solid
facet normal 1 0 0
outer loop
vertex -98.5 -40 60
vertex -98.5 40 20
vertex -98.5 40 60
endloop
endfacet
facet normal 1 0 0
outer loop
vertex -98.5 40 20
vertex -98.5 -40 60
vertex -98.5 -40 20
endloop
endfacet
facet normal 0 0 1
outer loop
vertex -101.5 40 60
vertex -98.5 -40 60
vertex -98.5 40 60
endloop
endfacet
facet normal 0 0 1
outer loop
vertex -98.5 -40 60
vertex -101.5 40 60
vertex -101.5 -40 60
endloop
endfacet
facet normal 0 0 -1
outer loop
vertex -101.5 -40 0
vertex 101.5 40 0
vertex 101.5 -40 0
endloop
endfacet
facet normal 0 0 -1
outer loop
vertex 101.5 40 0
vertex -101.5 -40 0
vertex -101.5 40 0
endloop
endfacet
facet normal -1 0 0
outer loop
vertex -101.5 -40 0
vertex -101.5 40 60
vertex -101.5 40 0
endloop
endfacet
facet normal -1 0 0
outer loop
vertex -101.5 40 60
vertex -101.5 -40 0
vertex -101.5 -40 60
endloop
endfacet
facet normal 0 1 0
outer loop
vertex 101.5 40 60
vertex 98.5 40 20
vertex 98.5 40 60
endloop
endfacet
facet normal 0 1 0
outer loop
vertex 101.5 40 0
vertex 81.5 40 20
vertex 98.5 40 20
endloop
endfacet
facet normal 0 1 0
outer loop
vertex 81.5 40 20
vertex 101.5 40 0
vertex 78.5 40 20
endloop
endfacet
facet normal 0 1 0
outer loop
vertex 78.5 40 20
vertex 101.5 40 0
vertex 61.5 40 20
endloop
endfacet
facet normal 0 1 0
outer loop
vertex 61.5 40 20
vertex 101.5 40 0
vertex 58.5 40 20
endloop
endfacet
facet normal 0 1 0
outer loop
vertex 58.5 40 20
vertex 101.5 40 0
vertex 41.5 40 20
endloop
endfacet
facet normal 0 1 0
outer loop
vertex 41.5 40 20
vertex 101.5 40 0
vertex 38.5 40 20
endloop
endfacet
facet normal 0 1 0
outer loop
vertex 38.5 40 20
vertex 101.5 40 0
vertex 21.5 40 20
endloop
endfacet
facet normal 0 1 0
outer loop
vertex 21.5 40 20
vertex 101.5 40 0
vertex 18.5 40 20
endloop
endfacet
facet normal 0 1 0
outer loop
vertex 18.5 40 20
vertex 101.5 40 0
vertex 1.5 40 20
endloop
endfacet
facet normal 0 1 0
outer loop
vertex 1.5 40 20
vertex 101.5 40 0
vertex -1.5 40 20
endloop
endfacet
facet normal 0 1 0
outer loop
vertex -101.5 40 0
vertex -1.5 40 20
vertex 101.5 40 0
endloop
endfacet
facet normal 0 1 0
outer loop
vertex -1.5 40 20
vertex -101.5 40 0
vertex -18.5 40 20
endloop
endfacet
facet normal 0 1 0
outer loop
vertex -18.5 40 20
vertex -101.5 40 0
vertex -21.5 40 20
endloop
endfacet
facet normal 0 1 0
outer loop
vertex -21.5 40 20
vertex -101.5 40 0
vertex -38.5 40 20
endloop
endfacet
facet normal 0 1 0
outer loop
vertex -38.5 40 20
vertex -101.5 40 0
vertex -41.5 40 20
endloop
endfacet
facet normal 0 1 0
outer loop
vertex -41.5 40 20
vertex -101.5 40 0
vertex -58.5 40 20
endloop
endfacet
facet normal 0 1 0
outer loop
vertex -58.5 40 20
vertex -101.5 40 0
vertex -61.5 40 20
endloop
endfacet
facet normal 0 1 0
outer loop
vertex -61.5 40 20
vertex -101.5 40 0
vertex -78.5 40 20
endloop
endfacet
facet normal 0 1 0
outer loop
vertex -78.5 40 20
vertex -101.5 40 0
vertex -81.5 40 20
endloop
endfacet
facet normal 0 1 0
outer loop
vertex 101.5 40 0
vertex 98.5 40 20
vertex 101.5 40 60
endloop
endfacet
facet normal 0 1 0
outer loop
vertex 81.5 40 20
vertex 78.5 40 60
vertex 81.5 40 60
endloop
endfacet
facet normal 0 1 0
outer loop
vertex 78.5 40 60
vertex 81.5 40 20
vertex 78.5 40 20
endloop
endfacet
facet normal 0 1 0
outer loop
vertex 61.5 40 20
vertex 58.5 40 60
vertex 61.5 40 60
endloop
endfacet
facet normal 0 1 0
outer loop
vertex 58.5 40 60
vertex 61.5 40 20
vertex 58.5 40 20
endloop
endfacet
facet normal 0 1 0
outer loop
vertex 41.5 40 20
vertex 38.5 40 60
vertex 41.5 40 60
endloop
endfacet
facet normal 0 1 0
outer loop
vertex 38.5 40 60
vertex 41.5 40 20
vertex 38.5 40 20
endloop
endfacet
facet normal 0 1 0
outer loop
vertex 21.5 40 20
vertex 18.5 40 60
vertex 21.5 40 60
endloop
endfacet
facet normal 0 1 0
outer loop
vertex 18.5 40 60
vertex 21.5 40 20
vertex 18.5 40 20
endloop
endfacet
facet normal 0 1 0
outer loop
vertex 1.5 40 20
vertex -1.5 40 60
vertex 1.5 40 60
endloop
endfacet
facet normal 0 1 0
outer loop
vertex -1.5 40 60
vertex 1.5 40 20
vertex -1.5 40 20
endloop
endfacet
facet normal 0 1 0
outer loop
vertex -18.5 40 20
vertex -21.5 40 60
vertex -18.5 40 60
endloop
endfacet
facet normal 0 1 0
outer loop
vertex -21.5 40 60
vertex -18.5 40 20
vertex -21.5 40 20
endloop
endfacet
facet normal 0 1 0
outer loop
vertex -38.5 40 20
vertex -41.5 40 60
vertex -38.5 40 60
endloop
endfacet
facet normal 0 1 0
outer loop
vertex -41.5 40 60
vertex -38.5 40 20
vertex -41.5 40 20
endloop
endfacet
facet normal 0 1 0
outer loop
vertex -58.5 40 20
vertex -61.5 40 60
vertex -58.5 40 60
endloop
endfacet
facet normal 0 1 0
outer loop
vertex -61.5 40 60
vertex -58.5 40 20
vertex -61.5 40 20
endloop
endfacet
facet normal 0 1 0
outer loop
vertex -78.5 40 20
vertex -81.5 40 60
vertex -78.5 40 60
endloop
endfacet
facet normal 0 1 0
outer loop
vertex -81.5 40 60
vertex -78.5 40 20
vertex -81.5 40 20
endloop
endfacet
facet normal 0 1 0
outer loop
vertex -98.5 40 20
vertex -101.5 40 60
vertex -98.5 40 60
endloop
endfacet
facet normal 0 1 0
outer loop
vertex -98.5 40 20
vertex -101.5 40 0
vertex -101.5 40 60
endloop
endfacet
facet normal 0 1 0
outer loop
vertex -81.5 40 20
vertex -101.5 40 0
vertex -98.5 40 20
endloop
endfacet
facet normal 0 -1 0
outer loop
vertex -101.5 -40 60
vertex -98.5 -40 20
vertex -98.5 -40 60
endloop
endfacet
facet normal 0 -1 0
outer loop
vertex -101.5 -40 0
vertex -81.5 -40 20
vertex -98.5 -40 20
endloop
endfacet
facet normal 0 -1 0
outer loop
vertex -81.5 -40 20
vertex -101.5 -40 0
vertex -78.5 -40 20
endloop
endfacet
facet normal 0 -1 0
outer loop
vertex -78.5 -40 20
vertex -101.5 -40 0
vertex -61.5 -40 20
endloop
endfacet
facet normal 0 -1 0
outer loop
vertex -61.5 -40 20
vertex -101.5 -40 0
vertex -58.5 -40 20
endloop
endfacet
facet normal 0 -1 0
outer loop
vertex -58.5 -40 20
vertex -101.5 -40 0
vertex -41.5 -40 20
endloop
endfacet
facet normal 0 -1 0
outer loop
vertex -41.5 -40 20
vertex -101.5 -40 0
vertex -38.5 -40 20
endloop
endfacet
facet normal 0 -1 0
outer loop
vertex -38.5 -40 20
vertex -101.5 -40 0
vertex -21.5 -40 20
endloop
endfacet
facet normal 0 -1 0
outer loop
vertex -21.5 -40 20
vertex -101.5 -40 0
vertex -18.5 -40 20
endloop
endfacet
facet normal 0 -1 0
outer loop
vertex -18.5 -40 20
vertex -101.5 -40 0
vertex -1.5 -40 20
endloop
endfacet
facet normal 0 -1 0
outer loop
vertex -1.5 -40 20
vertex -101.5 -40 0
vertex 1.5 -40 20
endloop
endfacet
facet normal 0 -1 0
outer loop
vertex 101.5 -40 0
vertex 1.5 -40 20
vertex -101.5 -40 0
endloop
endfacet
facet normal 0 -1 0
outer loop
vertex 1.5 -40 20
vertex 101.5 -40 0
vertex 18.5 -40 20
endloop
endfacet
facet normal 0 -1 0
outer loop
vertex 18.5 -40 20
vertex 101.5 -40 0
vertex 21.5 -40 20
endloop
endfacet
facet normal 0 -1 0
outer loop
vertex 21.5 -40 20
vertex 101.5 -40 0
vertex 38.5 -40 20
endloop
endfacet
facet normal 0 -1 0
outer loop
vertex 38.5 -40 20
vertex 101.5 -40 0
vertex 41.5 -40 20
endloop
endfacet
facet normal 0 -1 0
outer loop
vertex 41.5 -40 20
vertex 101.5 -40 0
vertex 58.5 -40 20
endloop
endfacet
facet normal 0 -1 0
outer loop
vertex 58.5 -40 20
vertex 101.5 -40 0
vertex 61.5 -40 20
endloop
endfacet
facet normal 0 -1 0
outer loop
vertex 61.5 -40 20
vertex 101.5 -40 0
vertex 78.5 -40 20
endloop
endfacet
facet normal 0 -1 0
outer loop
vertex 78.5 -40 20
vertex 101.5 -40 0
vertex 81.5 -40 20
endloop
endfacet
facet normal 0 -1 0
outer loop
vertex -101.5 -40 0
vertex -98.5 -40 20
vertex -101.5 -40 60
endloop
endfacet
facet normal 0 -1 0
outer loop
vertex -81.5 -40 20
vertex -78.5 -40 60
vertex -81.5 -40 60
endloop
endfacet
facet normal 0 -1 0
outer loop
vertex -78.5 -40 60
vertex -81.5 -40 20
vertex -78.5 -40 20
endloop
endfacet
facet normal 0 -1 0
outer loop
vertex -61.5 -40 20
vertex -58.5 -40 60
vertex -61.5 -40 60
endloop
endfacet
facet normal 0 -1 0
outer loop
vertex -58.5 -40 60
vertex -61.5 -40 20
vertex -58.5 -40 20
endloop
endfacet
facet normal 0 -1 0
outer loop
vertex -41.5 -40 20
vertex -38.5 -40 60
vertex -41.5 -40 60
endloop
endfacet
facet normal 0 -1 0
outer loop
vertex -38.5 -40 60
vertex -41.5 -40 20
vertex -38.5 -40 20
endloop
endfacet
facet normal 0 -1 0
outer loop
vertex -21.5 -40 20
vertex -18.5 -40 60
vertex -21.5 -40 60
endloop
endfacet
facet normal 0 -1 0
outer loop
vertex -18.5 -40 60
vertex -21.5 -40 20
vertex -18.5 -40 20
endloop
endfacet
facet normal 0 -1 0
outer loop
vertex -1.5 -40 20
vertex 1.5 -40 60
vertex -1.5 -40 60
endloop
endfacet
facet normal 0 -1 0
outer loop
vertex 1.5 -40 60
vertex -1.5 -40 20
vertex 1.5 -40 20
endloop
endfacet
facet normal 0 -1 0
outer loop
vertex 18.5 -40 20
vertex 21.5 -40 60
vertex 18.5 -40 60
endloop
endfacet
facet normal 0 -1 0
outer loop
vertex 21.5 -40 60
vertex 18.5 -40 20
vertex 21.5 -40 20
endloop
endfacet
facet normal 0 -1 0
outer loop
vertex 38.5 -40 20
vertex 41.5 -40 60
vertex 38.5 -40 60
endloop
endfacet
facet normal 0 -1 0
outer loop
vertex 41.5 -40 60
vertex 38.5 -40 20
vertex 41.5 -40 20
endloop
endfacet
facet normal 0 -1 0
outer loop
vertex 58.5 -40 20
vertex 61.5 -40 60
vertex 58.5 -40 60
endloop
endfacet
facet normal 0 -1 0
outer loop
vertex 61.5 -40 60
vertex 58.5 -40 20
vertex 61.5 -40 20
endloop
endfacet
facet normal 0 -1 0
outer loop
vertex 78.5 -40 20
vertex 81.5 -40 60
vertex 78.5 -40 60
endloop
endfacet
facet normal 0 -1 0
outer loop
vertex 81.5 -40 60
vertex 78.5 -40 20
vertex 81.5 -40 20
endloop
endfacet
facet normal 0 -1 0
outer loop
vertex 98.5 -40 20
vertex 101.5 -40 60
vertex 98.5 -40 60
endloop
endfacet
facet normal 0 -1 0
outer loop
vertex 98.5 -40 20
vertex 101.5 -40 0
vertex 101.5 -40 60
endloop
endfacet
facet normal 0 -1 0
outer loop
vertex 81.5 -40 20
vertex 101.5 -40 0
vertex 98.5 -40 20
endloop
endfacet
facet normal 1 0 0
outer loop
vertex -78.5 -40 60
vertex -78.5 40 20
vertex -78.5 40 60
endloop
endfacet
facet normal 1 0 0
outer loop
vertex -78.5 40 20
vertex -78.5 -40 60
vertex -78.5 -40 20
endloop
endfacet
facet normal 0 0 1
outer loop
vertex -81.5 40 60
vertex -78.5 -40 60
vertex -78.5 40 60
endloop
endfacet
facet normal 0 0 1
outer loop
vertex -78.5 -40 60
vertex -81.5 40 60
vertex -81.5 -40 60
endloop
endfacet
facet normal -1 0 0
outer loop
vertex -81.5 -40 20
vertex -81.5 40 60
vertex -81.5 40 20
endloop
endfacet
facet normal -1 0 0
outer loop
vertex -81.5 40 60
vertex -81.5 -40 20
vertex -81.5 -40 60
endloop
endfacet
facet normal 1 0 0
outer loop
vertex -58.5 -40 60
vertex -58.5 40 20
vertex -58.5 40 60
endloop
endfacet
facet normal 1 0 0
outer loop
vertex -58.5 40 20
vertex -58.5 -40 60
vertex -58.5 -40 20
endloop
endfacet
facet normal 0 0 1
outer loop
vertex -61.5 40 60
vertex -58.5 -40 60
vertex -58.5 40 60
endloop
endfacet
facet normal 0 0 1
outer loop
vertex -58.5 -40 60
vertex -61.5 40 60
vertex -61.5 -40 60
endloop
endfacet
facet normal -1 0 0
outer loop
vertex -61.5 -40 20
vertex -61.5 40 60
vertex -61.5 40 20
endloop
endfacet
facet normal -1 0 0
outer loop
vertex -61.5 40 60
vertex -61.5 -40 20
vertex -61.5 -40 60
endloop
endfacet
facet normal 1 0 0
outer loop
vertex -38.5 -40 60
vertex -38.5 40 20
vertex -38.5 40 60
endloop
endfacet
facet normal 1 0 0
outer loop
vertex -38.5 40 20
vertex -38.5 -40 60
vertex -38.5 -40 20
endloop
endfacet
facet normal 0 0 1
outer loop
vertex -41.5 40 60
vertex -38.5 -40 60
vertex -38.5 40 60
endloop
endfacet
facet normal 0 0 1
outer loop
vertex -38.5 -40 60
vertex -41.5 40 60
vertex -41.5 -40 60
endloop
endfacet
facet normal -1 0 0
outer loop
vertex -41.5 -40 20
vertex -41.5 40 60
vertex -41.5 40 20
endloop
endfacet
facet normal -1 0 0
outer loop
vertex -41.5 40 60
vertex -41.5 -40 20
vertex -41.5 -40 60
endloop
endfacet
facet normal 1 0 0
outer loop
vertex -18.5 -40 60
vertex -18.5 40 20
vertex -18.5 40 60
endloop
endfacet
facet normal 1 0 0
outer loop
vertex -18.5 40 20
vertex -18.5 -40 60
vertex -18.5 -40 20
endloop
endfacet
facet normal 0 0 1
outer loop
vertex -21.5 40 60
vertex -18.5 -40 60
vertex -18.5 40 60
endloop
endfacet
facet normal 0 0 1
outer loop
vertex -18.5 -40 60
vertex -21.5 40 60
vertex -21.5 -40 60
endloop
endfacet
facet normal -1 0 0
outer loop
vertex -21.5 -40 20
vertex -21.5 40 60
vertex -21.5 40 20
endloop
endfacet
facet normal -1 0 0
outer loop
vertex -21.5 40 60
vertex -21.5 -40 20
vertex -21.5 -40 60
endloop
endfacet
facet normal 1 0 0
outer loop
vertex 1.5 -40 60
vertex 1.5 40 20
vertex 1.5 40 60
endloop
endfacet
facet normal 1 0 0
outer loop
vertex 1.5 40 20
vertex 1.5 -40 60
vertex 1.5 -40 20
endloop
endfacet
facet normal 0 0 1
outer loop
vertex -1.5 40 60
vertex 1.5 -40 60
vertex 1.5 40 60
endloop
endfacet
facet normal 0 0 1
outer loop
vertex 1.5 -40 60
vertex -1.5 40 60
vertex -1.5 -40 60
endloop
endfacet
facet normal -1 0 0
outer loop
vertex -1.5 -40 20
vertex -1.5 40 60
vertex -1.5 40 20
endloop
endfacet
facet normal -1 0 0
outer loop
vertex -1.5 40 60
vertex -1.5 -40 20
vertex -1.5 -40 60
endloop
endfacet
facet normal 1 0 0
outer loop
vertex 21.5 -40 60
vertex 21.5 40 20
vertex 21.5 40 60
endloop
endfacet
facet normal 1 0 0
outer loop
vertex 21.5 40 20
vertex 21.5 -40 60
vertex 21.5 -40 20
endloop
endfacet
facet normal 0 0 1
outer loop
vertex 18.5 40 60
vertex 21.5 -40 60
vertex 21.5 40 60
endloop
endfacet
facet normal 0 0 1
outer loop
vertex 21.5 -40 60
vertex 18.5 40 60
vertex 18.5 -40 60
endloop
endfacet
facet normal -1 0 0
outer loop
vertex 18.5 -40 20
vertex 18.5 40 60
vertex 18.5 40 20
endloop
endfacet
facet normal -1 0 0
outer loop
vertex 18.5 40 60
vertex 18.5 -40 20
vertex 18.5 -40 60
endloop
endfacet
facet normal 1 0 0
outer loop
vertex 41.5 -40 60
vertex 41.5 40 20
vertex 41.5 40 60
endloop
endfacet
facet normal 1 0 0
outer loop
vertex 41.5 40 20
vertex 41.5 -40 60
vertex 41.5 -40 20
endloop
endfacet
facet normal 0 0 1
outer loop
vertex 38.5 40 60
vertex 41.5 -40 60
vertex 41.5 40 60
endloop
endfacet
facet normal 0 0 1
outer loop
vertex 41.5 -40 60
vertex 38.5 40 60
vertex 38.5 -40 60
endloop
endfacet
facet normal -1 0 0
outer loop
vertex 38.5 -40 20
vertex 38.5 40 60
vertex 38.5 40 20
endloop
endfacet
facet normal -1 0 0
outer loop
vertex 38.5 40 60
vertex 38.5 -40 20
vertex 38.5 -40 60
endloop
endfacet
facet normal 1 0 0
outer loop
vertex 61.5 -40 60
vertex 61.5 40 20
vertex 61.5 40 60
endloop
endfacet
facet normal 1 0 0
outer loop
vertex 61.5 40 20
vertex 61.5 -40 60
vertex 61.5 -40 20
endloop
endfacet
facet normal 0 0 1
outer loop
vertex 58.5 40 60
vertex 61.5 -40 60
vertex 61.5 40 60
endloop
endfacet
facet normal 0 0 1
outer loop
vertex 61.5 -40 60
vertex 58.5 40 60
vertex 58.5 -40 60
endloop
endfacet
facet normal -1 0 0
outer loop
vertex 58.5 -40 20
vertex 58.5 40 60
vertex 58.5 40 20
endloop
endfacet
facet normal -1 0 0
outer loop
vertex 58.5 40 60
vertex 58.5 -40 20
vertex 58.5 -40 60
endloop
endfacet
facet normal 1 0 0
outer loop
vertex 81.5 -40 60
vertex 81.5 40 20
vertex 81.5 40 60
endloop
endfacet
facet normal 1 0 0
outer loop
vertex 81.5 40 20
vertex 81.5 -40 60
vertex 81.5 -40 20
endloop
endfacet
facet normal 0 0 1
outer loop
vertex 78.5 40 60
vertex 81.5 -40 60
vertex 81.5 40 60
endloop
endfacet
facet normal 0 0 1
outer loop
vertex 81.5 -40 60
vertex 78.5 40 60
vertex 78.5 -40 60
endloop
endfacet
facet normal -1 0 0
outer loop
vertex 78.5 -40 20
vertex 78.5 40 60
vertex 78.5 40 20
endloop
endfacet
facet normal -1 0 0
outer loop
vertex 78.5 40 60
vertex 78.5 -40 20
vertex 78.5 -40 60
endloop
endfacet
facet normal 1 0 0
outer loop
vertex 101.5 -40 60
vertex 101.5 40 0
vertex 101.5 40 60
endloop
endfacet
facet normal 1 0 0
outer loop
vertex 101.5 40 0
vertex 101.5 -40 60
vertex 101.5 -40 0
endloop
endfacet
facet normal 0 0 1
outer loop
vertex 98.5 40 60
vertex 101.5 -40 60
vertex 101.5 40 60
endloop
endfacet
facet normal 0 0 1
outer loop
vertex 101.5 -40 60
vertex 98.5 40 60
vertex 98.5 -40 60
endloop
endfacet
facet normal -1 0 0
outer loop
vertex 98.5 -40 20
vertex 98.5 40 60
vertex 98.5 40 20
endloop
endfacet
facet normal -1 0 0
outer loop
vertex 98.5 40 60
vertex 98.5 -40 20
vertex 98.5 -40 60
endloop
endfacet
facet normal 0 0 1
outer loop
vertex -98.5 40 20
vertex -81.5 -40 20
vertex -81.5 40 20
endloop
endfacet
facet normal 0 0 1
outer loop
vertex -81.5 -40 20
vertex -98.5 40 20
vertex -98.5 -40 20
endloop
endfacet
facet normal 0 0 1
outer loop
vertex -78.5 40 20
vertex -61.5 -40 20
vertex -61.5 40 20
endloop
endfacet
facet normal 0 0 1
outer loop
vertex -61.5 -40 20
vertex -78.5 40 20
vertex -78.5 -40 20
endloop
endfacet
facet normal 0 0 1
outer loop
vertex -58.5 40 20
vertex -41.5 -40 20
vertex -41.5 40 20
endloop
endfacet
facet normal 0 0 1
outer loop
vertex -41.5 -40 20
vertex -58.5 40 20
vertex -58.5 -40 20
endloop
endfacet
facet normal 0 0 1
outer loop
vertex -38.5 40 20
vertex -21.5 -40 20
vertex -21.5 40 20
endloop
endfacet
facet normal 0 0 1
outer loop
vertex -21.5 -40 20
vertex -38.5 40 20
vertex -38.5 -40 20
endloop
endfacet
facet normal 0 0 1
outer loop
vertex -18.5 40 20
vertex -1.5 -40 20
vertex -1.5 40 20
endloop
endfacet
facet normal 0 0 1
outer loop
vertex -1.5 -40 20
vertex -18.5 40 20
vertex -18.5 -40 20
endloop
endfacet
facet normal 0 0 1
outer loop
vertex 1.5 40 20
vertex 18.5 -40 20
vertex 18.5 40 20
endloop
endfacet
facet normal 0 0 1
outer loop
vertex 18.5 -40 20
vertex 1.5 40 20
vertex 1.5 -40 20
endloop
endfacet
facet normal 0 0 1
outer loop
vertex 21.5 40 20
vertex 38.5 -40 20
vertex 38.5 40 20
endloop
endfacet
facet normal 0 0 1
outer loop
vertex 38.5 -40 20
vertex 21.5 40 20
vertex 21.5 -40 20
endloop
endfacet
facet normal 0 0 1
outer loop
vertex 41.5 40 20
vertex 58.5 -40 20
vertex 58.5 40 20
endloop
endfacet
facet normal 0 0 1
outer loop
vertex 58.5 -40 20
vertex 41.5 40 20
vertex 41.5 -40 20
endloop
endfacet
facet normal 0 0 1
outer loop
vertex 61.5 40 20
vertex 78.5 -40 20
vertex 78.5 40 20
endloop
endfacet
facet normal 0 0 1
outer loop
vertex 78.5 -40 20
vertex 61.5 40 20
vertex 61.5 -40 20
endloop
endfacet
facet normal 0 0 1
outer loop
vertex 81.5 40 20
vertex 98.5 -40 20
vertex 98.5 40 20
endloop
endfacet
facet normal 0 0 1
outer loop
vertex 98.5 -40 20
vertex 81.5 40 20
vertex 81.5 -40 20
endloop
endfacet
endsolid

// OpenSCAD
// Dimensions (mm) - measured with calipers
base_length = 203;
base_width = 80;
base_height = 20;

cradle_radius = 46;
cradle_axis_y = 0;
cradle_axis_z = 52;

divider_thickness = 3;
divider_height = 60;
num_dividers = 11;
slot_width = 17; // 20 mm spacing - 3 mm divider = 17 mm slot

// Quality
$fn = 64;

// Center the base on the origin in X and Y
base_x = -base_length / 2;
base_y = -base_width / 2;

// Build the base block
union() {
    // Base block
    translate([base_x, base_y, 0])
        cube([base_length, base_width, base_height]);

    // Divider plates
    for (i = [0 : num_dividers - 1]) {
        // Calculate x position for each divider
        // Dividers at x = -100, -80, ..., 100
        // Centered on the base: base goes from -101.5 to 101.5
        // Dividers are 20 mm apart, centered on the base
        x_pos = -100 + i * 20;
        
        translate([x_pos - divider_thickness/2, base_y, 0])
            cube([divider_thickness, base_width, divider_height]);
    }
}

// Cut the cradle along the whole length
// The cradle is the inside of a cylinder of radius 46 mm
// Axis runs along X at y = 0, z = 52
// So the cylinder center is at (any x, 0, 52)
// We need to subtract this cylinder from the base
// The cylinder extends along X, so we make it longer than the base
difference() {
    // Empty - the difference is applied to the union above
    // We need to restructure: put the union inside the difference
}

// Restructured: Base + Dividers minus Cradle
difference() {
    union() {
        // Base block
        translate([base_x, base_y, 0])
            cube([base_length, base_width, base_height]);

        // Divider plates
        for (i = [0 : num_dividers - 1]) {
            x_pos = -100 + i * 20;
            translate([x_pos - divider_thickness/2, base_y, 0])
                cube([divider_thickness, base_width, divider_height]);
        }
    }
    
    // Cradle cut: cylinder along X axis
    // Center at y=0, z=52, radius=46
    // Extend past the base in X direction
    translate([0, cradle_axis_y, cradle_axis_z])
        rotate([90, 0, 0]) // Rotate so cylinder axis is along X
        cylinder(r = cradle_radius, h = base_length + 2, center = true);
}
